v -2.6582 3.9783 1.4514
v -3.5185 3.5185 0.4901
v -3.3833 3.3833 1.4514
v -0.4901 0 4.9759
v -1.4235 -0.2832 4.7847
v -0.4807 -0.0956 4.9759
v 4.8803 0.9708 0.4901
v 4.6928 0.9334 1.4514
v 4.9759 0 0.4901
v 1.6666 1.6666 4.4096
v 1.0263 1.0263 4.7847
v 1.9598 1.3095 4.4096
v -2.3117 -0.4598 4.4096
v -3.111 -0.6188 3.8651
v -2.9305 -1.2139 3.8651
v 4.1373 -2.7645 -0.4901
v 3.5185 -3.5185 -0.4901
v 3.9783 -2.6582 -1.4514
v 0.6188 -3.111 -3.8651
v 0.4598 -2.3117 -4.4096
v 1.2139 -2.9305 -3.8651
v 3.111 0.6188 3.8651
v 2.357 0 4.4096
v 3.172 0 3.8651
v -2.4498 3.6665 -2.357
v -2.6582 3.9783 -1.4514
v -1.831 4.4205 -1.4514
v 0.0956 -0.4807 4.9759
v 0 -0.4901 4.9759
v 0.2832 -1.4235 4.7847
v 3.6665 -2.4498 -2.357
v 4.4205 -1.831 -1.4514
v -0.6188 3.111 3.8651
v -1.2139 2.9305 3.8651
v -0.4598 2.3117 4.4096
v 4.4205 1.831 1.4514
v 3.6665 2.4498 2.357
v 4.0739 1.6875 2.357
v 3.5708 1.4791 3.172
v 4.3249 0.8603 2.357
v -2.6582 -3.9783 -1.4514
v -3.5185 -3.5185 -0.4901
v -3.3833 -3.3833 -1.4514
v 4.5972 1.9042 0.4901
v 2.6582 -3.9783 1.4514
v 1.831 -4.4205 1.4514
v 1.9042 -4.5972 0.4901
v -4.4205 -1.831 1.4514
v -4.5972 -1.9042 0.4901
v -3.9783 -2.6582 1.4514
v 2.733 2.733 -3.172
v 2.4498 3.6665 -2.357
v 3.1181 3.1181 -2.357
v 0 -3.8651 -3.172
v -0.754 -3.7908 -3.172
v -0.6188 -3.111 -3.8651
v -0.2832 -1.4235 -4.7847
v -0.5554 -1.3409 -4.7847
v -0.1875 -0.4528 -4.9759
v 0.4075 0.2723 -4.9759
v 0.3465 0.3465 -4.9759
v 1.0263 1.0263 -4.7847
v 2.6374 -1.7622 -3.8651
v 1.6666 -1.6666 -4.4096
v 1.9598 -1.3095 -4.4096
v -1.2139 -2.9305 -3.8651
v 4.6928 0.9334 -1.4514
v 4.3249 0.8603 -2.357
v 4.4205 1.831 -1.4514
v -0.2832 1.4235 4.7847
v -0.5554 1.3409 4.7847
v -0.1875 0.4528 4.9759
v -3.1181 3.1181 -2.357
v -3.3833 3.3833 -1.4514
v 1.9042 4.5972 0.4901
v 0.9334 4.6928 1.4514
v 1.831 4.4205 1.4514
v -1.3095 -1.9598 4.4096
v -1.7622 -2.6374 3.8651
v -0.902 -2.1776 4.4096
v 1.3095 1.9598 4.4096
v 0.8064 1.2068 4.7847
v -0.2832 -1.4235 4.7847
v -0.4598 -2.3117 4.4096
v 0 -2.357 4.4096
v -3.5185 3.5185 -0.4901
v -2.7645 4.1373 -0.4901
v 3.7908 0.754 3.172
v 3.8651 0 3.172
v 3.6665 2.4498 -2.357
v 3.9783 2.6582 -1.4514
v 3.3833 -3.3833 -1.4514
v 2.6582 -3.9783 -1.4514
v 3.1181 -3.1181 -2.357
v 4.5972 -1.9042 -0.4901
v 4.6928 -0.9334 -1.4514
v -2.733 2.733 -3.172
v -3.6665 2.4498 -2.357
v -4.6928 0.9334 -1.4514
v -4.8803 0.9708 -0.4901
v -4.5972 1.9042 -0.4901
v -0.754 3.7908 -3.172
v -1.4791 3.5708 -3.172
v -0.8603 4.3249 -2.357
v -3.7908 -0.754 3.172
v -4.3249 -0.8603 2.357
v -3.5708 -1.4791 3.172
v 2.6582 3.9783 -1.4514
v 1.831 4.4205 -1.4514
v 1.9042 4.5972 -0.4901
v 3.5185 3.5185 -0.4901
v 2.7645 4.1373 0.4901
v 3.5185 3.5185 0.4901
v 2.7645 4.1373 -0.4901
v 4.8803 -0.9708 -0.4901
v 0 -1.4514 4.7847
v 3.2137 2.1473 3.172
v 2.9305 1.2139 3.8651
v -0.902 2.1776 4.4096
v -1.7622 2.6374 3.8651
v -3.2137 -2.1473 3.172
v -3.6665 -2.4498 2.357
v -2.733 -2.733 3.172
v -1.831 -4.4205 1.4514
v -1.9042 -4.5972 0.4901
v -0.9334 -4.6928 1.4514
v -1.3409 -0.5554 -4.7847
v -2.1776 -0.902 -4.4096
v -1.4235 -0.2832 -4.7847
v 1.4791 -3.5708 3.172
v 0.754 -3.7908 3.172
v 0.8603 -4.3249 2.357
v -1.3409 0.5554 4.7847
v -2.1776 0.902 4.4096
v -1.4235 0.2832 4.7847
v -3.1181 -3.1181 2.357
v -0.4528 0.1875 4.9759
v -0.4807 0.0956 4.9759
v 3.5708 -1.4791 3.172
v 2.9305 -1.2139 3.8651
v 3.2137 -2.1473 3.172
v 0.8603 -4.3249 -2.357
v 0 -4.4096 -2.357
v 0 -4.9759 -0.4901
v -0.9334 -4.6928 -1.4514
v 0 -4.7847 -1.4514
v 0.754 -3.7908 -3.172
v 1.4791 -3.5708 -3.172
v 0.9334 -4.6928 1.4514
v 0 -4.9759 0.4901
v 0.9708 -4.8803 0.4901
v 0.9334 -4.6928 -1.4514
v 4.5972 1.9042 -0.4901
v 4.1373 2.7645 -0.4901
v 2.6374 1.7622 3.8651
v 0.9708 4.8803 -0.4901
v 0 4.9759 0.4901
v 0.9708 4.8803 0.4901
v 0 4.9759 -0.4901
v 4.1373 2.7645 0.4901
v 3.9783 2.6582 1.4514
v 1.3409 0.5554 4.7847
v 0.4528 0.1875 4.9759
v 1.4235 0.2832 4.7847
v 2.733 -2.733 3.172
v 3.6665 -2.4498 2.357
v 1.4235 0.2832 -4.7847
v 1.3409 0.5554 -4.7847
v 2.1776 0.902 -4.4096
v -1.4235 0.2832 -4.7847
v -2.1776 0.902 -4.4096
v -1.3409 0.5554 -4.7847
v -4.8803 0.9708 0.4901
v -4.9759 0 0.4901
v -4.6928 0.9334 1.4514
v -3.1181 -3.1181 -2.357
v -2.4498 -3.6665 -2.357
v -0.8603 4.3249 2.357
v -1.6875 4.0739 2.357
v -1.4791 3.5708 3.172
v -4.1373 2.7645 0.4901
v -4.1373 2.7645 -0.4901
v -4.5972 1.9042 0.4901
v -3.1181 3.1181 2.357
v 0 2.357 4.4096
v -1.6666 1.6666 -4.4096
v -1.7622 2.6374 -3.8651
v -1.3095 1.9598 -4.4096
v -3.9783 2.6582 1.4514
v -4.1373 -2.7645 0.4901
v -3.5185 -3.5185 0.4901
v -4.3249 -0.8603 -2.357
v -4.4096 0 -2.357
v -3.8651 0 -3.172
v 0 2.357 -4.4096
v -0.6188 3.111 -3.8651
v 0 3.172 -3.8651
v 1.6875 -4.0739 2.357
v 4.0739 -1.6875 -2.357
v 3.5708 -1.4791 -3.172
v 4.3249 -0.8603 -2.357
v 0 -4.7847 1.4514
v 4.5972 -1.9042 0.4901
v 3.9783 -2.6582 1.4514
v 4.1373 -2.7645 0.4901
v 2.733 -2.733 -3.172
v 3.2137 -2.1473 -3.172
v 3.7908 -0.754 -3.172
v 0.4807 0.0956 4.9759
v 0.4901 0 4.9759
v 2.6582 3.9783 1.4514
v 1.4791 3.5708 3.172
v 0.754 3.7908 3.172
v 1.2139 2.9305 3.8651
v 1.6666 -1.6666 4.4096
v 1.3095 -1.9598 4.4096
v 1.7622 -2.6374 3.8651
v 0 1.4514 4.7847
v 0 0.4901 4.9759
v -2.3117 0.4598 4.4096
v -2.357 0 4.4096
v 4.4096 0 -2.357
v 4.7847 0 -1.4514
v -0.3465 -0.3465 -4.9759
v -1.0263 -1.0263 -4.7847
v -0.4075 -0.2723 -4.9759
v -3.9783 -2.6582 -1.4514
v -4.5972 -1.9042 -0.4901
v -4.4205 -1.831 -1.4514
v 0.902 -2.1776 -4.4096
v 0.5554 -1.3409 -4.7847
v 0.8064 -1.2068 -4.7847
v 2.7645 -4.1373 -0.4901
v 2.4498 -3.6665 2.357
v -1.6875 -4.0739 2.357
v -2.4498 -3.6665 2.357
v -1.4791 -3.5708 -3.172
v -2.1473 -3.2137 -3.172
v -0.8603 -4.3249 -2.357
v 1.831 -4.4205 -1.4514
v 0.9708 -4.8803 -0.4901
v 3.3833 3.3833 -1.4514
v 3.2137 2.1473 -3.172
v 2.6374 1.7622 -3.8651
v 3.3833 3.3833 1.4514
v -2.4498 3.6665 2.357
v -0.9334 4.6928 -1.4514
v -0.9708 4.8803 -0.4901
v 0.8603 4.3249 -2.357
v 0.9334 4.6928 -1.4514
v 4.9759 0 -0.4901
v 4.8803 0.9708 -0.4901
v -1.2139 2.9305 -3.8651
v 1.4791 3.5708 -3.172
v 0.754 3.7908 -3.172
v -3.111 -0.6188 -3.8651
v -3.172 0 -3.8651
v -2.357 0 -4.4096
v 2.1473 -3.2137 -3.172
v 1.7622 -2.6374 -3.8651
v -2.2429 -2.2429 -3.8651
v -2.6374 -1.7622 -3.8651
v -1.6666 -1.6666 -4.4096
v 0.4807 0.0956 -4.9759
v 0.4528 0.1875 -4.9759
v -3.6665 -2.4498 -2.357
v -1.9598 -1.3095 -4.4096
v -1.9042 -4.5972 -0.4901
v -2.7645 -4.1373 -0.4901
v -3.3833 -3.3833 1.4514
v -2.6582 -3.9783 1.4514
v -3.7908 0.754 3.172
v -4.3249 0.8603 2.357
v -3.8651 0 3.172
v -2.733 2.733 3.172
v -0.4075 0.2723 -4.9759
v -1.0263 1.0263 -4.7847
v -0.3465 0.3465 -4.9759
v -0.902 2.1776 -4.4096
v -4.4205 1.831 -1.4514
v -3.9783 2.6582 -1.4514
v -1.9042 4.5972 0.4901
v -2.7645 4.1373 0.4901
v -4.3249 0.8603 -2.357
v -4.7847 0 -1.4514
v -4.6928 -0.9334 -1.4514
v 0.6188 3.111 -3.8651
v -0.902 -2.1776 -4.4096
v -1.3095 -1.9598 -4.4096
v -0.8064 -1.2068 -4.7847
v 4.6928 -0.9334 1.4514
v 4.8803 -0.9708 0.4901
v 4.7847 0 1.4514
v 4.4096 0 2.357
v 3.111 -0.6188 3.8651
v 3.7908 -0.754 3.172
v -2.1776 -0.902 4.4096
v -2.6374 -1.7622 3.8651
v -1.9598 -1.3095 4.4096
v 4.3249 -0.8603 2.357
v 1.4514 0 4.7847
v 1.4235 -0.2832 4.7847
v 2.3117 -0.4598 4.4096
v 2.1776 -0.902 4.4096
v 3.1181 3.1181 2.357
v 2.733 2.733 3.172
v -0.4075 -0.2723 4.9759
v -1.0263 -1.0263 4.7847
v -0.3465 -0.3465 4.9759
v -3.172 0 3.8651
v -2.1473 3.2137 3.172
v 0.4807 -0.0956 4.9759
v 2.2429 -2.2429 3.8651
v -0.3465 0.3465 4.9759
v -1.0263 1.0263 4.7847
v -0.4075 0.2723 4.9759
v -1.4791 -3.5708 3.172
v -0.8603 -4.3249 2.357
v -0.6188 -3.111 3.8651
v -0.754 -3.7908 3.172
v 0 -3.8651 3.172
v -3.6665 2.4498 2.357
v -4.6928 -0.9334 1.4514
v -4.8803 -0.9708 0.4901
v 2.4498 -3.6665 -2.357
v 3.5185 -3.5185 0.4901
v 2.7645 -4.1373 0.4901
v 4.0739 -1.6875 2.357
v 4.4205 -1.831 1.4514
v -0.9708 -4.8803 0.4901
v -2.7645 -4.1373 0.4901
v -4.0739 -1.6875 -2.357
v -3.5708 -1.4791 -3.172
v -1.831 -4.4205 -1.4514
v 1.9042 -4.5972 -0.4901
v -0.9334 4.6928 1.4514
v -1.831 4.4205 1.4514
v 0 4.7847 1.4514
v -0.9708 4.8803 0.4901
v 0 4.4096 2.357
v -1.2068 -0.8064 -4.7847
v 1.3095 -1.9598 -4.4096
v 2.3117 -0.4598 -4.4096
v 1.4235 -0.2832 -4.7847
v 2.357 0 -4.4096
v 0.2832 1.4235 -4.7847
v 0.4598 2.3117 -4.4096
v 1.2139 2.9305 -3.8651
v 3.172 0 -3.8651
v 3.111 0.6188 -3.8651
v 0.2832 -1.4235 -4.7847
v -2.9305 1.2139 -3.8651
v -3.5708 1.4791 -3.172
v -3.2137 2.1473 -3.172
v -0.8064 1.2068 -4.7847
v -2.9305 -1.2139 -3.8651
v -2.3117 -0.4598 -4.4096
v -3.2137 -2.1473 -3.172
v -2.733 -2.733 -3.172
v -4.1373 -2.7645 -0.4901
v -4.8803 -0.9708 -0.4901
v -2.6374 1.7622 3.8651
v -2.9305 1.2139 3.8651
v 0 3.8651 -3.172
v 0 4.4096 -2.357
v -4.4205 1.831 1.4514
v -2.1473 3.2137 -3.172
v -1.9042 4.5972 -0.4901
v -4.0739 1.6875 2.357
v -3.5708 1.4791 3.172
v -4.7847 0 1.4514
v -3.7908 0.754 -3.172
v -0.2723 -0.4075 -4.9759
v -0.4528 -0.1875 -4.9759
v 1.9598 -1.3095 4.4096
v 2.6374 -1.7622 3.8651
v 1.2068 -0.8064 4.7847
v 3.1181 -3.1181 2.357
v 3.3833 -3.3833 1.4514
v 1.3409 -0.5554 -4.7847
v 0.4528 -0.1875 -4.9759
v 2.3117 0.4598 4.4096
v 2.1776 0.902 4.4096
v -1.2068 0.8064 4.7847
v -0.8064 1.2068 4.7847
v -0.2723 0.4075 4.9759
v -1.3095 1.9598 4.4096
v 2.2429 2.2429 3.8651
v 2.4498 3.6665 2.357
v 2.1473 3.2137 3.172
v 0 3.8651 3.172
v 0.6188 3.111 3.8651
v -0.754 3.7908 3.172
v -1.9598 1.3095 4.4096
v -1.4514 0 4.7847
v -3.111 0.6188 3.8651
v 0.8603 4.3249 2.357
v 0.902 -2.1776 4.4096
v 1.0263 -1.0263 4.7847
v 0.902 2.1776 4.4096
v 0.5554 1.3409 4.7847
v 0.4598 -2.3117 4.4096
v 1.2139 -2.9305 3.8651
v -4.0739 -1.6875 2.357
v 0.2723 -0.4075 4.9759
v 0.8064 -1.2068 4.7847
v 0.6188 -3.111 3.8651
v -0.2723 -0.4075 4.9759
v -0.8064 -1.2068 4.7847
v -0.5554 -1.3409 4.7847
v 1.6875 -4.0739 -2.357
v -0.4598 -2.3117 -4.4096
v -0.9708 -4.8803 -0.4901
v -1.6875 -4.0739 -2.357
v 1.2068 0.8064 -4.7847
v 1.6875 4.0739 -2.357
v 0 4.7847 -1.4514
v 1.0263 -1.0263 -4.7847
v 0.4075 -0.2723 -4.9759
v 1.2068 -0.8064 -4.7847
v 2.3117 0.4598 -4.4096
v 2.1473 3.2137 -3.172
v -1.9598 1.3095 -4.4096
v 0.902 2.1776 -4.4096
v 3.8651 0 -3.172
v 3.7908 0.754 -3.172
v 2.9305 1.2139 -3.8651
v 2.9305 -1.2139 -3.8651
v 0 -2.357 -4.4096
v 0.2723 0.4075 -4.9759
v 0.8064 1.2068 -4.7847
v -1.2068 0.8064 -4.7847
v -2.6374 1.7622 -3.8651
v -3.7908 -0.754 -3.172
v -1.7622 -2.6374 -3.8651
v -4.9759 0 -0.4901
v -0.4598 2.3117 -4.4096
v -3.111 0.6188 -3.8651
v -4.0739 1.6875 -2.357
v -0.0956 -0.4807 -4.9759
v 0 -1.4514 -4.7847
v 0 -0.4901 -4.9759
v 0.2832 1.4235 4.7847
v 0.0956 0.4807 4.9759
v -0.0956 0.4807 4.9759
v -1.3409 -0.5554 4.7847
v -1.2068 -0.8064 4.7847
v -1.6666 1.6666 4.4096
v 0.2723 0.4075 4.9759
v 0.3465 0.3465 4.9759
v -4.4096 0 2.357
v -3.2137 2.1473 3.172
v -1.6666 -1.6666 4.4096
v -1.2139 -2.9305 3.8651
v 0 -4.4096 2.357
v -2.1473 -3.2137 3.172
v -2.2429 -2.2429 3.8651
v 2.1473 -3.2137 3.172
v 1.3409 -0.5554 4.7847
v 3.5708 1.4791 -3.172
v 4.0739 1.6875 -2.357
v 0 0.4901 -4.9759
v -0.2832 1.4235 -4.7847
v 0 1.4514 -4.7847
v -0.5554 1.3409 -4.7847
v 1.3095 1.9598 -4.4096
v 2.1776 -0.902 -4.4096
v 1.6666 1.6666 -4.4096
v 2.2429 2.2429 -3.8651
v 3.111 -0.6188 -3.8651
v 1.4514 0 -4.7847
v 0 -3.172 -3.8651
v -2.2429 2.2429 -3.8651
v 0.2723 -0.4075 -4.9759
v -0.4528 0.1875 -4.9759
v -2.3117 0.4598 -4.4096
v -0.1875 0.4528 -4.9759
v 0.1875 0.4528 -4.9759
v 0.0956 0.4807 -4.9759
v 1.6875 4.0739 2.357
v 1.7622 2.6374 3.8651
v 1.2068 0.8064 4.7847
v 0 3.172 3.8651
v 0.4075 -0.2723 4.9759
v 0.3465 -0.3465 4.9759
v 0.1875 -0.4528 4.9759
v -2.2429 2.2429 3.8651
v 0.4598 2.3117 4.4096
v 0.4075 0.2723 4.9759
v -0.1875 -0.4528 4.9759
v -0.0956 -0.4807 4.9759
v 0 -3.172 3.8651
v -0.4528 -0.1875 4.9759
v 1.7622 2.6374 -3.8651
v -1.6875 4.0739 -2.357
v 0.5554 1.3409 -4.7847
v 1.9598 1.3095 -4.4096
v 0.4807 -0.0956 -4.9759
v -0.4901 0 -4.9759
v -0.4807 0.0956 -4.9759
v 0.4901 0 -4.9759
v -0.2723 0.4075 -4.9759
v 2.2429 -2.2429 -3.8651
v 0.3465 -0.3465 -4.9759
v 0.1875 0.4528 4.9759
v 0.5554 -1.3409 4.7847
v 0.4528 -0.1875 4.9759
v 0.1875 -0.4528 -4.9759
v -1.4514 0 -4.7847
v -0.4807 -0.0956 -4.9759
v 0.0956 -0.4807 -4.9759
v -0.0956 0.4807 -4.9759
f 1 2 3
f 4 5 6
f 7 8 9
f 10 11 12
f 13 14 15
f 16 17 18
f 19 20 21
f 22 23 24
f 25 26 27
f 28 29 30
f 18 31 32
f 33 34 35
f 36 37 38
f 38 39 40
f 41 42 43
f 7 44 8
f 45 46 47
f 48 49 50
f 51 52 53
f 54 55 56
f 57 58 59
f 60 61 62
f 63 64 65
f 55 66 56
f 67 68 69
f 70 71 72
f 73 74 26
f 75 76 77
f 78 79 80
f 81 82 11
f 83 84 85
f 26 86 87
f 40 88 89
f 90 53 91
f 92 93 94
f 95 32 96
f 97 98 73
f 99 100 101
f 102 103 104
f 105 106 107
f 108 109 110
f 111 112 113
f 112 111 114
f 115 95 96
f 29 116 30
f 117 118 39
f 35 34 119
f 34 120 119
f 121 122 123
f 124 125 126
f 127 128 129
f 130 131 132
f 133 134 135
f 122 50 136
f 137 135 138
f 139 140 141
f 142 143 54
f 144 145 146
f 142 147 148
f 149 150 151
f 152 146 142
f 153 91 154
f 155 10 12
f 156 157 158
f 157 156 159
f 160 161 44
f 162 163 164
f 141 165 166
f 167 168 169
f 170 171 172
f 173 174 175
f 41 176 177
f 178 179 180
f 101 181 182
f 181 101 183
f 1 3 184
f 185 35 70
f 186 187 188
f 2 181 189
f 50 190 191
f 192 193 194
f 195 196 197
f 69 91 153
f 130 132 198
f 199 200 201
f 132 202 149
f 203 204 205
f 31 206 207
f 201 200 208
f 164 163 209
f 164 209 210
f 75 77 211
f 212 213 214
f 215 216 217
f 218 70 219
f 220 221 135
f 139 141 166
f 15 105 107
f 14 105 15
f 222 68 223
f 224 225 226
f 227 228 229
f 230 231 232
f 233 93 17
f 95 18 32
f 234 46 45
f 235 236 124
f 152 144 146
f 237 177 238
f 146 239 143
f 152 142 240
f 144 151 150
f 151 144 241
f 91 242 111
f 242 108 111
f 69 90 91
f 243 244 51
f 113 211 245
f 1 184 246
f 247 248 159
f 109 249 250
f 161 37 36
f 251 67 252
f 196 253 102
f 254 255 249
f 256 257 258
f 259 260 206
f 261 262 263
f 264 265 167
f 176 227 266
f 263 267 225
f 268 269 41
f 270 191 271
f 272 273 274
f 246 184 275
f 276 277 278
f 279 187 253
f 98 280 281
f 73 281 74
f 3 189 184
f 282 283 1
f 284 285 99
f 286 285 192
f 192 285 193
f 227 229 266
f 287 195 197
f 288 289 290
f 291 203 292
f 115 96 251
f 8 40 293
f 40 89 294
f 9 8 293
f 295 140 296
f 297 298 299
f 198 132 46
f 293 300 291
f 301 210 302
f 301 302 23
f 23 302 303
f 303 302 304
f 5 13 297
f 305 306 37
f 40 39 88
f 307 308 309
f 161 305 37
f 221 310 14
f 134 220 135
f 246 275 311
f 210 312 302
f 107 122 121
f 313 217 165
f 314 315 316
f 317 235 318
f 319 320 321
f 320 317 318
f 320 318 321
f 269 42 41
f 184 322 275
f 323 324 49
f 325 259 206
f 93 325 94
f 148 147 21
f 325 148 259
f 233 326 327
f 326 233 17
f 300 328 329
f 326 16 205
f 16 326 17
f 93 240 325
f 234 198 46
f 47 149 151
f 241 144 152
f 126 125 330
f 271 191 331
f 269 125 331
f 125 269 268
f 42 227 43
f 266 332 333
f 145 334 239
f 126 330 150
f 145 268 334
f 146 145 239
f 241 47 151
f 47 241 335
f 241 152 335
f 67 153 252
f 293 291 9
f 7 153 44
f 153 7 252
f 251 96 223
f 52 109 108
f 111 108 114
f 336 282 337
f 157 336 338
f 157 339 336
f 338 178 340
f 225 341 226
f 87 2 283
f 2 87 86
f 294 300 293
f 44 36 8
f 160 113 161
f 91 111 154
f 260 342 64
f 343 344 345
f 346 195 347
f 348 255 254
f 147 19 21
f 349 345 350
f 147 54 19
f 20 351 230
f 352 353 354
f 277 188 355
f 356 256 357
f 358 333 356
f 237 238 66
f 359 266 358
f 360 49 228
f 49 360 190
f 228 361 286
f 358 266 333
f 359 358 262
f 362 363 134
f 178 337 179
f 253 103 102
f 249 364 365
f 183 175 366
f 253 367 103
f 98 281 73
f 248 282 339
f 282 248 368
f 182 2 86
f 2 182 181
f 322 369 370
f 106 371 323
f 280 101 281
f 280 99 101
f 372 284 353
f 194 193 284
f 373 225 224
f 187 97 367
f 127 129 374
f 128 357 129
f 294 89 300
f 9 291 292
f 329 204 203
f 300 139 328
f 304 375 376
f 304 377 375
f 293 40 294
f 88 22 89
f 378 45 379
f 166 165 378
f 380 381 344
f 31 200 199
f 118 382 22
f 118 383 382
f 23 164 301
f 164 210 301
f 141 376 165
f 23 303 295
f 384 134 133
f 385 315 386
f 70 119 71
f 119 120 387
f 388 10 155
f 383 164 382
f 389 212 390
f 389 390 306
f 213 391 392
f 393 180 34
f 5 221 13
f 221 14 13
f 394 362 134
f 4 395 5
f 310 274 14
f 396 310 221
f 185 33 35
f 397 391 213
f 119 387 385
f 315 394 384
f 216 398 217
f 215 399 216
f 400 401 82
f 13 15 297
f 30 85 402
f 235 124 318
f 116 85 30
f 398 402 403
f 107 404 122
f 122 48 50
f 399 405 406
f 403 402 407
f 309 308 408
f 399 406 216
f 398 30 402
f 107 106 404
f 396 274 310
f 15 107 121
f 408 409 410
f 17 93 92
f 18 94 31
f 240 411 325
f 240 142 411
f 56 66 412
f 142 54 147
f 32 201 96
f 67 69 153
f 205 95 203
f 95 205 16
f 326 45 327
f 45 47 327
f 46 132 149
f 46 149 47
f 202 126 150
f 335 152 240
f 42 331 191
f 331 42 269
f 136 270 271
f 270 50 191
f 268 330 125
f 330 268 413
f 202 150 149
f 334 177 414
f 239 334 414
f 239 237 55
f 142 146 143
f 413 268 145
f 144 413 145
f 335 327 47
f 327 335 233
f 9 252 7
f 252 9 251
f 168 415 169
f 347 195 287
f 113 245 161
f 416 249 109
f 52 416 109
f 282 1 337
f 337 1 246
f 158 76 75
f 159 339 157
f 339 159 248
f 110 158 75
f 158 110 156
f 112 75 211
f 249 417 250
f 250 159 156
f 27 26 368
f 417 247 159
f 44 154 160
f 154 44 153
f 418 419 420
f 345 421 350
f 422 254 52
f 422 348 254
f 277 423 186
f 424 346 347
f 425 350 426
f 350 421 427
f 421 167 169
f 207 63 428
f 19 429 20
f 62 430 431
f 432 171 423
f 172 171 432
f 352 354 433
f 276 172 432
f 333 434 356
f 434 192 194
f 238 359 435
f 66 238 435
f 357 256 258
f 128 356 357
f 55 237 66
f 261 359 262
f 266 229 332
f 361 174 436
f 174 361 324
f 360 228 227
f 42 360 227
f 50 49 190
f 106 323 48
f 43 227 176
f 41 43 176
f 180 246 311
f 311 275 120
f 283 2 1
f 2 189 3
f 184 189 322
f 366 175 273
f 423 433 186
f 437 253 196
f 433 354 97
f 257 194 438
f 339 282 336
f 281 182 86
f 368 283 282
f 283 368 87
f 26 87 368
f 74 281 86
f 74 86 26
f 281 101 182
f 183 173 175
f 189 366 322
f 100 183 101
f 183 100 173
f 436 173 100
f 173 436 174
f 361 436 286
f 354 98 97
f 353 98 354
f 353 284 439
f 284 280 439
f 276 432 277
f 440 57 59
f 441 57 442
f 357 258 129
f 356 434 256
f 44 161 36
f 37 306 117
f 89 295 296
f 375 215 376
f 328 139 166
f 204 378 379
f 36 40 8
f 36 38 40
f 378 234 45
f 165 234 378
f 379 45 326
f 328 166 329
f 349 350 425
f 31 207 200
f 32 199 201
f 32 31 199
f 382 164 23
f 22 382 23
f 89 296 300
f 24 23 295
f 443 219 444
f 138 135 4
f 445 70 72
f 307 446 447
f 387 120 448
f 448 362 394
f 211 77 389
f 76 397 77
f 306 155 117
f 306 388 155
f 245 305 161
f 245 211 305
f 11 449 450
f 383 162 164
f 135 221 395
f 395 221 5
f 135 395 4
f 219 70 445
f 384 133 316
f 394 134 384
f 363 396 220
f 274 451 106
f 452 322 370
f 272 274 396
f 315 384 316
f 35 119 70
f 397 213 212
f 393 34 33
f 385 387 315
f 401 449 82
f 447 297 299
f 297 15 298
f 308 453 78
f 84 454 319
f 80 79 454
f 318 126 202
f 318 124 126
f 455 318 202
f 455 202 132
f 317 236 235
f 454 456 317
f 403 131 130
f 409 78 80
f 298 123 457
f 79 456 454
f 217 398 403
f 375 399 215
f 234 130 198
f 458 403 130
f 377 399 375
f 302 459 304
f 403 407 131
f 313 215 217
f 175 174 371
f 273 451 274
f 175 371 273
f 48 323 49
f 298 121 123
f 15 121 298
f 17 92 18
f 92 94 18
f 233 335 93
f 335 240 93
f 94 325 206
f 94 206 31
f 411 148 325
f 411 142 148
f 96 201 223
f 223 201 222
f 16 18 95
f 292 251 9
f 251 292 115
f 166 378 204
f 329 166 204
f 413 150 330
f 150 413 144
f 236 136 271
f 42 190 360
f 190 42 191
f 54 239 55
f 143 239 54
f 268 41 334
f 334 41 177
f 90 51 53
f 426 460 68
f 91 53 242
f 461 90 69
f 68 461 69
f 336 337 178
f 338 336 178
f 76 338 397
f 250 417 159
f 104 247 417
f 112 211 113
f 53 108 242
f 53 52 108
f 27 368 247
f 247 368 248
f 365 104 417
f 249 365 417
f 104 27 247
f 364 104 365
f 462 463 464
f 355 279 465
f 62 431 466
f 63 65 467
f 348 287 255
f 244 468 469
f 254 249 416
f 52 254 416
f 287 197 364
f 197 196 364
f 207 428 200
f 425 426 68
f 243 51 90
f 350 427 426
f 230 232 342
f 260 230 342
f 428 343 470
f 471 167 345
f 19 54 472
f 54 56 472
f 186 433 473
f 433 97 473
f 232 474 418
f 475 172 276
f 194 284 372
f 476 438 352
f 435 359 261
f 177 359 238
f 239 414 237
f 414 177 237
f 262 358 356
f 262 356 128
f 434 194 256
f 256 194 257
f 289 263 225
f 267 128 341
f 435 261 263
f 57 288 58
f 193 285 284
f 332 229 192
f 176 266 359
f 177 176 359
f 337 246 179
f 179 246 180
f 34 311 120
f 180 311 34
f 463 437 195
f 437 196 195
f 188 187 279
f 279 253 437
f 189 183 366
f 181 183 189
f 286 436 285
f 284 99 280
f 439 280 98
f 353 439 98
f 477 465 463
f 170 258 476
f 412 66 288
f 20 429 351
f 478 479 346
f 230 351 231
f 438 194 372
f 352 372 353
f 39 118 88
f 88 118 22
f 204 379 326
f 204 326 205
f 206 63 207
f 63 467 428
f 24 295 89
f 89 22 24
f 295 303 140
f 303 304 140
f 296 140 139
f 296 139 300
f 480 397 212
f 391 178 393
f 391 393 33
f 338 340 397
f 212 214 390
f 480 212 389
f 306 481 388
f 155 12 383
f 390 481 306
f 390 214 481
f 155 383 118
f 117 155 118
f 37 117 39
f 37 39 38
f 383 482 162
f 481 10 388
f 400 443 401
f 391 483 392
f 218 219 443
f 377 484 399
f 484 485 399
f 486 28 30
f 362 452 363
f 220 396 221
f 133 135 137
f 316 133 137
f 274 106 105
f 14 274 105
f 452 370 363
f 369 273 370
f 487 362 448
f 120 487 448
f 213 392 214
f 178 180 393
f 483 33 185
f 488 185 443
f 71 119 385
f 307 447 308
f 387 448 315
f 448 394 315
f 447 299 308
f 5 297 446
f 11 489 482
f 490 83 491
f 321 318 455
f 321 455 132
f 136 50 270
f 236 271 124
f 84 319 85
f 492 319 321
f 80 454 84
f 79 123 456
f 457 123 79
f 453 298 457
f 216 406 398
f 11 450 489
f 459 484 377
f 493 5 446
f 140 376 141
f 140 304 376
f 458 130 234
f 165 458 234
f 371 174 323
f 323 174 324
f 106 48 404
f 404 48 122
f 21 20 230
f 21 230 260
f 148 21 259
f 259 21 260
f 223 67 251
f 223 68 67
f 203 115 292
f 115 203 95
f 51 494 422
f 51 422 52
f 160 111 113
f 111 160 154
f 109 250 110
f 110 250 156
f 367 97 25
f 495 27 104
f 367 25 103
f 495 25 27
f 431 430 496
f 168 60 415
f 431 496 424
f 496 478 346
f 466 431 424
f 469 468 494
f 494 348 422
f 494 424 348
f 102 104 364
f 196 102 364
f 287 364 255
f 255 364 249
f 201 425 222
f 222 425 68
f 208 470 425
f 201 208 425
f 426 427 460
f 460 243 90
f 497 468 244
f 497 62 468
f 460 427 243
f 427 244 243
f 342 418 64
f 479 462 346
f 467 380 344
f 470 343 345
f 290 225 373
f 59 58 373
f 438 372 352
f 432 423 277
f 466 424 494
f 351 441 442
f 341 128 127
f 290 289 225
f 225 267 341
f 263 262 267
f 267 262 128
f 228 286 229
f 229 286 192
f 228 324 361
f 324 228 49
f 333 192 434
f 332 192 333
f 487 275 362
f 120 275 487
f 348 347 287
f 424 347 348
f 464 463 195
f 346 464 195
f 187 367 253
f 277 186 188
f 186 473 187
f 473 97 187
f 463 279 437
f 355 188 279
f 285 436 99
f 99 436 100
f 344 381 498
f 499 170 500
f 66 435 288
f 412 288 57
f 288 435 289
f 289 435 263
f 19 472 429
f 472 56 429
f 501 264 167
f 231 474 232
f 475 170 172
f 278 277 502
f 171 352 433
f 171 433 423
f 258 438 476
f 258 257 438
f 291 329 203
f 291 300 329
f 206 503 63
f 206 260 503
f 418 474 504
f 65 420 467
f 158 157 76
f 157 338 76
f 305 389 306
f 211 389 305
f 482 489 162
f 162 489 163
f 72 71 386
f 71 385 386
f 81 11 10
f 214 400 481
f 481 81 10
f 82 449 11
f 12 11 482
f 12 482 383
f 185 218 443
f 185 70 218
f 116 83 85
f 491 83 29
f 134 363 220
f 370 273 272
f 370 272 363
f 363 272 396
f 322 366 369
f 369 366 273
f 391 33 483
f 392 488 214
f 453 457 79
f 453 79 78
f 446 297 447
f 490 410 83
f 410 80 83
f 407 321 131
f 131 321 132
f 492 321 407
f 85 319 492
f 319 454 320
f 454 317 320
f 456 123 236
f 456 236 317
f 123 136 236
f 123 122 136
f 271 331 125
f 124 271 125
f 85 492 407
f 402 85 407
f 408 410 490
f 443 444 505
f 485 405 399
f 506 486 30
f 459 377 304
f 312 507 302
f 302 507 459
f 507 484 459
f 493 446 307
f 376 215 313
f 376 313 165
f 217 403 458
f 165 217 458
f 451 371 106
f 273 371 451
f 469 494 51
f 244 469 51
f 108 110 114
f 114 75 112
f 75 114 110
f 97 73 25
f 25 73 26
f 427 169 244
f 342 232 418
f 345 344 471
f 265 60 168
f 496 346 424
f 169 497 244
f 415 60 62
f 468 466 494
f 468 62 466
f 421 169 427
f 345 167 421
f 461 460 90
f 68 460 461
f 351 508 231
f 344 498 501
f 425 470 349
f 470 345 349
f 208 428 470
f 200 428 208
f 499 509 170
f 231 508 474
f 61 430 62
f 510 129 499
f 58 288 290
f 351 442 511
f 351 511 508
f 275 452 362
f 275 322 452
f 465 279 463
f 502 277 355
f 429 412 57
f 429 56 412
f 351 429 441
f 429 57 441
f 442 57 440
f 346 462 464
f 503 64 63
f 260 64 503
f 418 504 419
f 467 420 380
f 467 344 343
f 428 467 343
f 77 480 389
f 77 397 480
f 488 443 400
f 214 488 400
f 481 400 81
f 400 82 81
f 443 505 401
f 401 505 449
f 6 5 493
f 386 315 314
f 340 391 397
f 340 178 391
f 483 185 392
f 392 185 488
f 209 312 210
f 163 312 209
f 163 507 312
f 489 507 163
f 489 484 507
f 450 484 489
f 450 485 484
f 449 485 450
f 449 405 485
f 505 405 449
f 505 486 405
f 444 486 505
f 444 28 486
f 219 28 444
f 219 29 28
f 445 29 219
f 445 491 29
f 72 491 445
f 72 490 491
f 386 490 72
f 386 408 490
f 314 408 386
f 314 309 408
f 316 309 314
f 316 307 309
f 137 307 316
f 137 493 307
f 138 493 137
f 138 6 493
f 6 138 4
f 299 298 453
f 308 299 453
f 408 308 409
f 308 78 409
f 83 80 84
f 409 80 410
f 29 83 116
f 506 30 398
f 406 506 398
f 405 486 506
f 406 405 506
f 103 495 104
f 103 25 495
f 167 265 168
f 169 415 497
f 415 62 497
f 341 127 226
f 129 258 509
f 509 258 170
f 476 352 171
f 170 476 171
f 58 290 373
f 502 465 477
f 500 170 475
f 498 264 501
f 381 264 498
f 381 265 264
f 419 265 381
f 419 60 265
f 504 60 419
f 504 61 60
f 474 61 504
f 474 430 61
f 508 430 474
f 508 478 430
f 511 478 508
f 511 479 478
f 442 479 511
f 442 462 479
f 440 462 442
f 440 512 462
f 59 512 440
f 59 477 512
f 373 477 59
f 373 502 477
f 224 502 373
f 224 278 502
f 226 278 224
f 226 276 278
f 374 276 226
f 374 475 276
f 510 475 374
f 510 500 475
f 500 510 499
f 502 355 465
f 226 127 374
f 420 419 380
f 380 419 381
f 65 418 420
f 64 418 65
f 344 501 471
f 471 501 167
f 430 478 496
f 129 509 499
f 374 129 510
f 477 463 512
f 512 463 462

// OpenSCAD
// Gravitational trickshot visualization
color([1, 0.9, 0.2]) sphere(5, $fn = 32);
color([0.3, 0.06, 0.06]) translate([0.0, 0.0, 0.0]) sphere(0.5, $fn = 8);
color([0.6499999999999999, 0.12999999999999998, 0.12999999999999998]) translate([0.0, 0.0, 0.0]) sphere(0.5, $fn = 8);
color([1, 0.2, 0.2]) translate([0.0, 0.0, 0.0]) sphere(2, $fn = 16);
color([1, 1, 1]) translate([0.0, 0.0, 0.0]) cube(1.5, center = true);
color([0.06, 0.3, 0.06]) translate([0.0, 0.0, 0.0]) sphere(0.5, $fn = 8);
color([0.12999999999999998, 0.6499999999999999, 0.12999999999999998]) translate([0.0, 0.0, 0.0]) sphere(0.5, $fn = 8);
color([0.2, 1, 0.2]) translate([0.0, 0.0, 0.0]) sphere(2, $fn = 16);
color([1, 1, 1]) translate([0.0, 0.0, 0.0]) cube(1.5, center = true);
color([0.06, 0.06, 0.3]) translate([0.0, 0.0, 0.0]) sphere(0.5, $fn = 8);
color([0.12999999999999998, 0.12999999999999998, 0.6499999999999999]) translate([0.0, 0.0, 0.0]) sphere(0.5, $fn = 8);
color([0.2, 0.2, 1]) translate([0.0, 0.0, 0.0]) sphere(2, $fn = 16);
color([1, 1, 1]) translate([0.0, 0.0, 0.0]) cube(1.5, center = true);
color([0.3, 0.3, 0.06]) translate([0.0, 0.0, 0.0]) sphere(0.5, $fn = 8);
color([0.6499999999999999, 0.6499999999999999, 0.12999999999999998]) translate([0.0, 0.0, 0.0]) sphere(0.5, $fn = 8);
color([1, 1, 0.2]) translate([0.0, 0.0, 0.0]) sphere(2, $fn = 16);
color([1, 1, 1]) translate([0.0, 0.0, 0.0]) cube(1.5, center = true);
color([0.3, 0.06, 0.3]) translate([0.0, 0.0, 0.0]) sphere(0.5, $fn = 8);
color([0.6499999999999999, 0.12999999999999998, 0.6499999999999999]) translate([0.0, 0.0, 0.0]) sphere(0.5, $fn = 8);
color([1, 0.2, 1]) translate([0.0, 0.0, 0.0]) sphere(2, $fn = 16);
color([1, 1, 1]) translate([0.0, 0.0, 0.0]) cube(1.5, center = true);
color([0.06, 0.3, 0.3]) translate([0.0, 0.0, 0.0]) sphere(0.5, $fn = 8);
color([0.12999999999999998, 0.6499999999999999, 0.6499999999999999]) translate([0.0, 0.0, 0.0]) sphere(0.5, $fn = 8);
color([0.2, 1, 1]) translate([0.0, 0.0, 0.0]) sphere(2, $fn = 16);
color([1, 1, 1]) translate([0.0, 0.0, 0.0]) cube(1.5, center = true);
color([0.3, 0.18, 0.06]) translate([0.0, 0.0, 0.0]) sphere(0.5, $fn = 8);
color([0.6499999999999999, 0.38999999999999996, 0.12999999999999998]) translate([0.0, 0.0, 0.0]) sphere(0.5, $fn = 8);
color([1, 0.6, 0.2]) translate([0.0, 0.0, 0.0]) sphere(2, $fn = 16);
color([1, 1, 1]) translate([0.0, 0.0, 0.0]) cube(1.5, center = true);
